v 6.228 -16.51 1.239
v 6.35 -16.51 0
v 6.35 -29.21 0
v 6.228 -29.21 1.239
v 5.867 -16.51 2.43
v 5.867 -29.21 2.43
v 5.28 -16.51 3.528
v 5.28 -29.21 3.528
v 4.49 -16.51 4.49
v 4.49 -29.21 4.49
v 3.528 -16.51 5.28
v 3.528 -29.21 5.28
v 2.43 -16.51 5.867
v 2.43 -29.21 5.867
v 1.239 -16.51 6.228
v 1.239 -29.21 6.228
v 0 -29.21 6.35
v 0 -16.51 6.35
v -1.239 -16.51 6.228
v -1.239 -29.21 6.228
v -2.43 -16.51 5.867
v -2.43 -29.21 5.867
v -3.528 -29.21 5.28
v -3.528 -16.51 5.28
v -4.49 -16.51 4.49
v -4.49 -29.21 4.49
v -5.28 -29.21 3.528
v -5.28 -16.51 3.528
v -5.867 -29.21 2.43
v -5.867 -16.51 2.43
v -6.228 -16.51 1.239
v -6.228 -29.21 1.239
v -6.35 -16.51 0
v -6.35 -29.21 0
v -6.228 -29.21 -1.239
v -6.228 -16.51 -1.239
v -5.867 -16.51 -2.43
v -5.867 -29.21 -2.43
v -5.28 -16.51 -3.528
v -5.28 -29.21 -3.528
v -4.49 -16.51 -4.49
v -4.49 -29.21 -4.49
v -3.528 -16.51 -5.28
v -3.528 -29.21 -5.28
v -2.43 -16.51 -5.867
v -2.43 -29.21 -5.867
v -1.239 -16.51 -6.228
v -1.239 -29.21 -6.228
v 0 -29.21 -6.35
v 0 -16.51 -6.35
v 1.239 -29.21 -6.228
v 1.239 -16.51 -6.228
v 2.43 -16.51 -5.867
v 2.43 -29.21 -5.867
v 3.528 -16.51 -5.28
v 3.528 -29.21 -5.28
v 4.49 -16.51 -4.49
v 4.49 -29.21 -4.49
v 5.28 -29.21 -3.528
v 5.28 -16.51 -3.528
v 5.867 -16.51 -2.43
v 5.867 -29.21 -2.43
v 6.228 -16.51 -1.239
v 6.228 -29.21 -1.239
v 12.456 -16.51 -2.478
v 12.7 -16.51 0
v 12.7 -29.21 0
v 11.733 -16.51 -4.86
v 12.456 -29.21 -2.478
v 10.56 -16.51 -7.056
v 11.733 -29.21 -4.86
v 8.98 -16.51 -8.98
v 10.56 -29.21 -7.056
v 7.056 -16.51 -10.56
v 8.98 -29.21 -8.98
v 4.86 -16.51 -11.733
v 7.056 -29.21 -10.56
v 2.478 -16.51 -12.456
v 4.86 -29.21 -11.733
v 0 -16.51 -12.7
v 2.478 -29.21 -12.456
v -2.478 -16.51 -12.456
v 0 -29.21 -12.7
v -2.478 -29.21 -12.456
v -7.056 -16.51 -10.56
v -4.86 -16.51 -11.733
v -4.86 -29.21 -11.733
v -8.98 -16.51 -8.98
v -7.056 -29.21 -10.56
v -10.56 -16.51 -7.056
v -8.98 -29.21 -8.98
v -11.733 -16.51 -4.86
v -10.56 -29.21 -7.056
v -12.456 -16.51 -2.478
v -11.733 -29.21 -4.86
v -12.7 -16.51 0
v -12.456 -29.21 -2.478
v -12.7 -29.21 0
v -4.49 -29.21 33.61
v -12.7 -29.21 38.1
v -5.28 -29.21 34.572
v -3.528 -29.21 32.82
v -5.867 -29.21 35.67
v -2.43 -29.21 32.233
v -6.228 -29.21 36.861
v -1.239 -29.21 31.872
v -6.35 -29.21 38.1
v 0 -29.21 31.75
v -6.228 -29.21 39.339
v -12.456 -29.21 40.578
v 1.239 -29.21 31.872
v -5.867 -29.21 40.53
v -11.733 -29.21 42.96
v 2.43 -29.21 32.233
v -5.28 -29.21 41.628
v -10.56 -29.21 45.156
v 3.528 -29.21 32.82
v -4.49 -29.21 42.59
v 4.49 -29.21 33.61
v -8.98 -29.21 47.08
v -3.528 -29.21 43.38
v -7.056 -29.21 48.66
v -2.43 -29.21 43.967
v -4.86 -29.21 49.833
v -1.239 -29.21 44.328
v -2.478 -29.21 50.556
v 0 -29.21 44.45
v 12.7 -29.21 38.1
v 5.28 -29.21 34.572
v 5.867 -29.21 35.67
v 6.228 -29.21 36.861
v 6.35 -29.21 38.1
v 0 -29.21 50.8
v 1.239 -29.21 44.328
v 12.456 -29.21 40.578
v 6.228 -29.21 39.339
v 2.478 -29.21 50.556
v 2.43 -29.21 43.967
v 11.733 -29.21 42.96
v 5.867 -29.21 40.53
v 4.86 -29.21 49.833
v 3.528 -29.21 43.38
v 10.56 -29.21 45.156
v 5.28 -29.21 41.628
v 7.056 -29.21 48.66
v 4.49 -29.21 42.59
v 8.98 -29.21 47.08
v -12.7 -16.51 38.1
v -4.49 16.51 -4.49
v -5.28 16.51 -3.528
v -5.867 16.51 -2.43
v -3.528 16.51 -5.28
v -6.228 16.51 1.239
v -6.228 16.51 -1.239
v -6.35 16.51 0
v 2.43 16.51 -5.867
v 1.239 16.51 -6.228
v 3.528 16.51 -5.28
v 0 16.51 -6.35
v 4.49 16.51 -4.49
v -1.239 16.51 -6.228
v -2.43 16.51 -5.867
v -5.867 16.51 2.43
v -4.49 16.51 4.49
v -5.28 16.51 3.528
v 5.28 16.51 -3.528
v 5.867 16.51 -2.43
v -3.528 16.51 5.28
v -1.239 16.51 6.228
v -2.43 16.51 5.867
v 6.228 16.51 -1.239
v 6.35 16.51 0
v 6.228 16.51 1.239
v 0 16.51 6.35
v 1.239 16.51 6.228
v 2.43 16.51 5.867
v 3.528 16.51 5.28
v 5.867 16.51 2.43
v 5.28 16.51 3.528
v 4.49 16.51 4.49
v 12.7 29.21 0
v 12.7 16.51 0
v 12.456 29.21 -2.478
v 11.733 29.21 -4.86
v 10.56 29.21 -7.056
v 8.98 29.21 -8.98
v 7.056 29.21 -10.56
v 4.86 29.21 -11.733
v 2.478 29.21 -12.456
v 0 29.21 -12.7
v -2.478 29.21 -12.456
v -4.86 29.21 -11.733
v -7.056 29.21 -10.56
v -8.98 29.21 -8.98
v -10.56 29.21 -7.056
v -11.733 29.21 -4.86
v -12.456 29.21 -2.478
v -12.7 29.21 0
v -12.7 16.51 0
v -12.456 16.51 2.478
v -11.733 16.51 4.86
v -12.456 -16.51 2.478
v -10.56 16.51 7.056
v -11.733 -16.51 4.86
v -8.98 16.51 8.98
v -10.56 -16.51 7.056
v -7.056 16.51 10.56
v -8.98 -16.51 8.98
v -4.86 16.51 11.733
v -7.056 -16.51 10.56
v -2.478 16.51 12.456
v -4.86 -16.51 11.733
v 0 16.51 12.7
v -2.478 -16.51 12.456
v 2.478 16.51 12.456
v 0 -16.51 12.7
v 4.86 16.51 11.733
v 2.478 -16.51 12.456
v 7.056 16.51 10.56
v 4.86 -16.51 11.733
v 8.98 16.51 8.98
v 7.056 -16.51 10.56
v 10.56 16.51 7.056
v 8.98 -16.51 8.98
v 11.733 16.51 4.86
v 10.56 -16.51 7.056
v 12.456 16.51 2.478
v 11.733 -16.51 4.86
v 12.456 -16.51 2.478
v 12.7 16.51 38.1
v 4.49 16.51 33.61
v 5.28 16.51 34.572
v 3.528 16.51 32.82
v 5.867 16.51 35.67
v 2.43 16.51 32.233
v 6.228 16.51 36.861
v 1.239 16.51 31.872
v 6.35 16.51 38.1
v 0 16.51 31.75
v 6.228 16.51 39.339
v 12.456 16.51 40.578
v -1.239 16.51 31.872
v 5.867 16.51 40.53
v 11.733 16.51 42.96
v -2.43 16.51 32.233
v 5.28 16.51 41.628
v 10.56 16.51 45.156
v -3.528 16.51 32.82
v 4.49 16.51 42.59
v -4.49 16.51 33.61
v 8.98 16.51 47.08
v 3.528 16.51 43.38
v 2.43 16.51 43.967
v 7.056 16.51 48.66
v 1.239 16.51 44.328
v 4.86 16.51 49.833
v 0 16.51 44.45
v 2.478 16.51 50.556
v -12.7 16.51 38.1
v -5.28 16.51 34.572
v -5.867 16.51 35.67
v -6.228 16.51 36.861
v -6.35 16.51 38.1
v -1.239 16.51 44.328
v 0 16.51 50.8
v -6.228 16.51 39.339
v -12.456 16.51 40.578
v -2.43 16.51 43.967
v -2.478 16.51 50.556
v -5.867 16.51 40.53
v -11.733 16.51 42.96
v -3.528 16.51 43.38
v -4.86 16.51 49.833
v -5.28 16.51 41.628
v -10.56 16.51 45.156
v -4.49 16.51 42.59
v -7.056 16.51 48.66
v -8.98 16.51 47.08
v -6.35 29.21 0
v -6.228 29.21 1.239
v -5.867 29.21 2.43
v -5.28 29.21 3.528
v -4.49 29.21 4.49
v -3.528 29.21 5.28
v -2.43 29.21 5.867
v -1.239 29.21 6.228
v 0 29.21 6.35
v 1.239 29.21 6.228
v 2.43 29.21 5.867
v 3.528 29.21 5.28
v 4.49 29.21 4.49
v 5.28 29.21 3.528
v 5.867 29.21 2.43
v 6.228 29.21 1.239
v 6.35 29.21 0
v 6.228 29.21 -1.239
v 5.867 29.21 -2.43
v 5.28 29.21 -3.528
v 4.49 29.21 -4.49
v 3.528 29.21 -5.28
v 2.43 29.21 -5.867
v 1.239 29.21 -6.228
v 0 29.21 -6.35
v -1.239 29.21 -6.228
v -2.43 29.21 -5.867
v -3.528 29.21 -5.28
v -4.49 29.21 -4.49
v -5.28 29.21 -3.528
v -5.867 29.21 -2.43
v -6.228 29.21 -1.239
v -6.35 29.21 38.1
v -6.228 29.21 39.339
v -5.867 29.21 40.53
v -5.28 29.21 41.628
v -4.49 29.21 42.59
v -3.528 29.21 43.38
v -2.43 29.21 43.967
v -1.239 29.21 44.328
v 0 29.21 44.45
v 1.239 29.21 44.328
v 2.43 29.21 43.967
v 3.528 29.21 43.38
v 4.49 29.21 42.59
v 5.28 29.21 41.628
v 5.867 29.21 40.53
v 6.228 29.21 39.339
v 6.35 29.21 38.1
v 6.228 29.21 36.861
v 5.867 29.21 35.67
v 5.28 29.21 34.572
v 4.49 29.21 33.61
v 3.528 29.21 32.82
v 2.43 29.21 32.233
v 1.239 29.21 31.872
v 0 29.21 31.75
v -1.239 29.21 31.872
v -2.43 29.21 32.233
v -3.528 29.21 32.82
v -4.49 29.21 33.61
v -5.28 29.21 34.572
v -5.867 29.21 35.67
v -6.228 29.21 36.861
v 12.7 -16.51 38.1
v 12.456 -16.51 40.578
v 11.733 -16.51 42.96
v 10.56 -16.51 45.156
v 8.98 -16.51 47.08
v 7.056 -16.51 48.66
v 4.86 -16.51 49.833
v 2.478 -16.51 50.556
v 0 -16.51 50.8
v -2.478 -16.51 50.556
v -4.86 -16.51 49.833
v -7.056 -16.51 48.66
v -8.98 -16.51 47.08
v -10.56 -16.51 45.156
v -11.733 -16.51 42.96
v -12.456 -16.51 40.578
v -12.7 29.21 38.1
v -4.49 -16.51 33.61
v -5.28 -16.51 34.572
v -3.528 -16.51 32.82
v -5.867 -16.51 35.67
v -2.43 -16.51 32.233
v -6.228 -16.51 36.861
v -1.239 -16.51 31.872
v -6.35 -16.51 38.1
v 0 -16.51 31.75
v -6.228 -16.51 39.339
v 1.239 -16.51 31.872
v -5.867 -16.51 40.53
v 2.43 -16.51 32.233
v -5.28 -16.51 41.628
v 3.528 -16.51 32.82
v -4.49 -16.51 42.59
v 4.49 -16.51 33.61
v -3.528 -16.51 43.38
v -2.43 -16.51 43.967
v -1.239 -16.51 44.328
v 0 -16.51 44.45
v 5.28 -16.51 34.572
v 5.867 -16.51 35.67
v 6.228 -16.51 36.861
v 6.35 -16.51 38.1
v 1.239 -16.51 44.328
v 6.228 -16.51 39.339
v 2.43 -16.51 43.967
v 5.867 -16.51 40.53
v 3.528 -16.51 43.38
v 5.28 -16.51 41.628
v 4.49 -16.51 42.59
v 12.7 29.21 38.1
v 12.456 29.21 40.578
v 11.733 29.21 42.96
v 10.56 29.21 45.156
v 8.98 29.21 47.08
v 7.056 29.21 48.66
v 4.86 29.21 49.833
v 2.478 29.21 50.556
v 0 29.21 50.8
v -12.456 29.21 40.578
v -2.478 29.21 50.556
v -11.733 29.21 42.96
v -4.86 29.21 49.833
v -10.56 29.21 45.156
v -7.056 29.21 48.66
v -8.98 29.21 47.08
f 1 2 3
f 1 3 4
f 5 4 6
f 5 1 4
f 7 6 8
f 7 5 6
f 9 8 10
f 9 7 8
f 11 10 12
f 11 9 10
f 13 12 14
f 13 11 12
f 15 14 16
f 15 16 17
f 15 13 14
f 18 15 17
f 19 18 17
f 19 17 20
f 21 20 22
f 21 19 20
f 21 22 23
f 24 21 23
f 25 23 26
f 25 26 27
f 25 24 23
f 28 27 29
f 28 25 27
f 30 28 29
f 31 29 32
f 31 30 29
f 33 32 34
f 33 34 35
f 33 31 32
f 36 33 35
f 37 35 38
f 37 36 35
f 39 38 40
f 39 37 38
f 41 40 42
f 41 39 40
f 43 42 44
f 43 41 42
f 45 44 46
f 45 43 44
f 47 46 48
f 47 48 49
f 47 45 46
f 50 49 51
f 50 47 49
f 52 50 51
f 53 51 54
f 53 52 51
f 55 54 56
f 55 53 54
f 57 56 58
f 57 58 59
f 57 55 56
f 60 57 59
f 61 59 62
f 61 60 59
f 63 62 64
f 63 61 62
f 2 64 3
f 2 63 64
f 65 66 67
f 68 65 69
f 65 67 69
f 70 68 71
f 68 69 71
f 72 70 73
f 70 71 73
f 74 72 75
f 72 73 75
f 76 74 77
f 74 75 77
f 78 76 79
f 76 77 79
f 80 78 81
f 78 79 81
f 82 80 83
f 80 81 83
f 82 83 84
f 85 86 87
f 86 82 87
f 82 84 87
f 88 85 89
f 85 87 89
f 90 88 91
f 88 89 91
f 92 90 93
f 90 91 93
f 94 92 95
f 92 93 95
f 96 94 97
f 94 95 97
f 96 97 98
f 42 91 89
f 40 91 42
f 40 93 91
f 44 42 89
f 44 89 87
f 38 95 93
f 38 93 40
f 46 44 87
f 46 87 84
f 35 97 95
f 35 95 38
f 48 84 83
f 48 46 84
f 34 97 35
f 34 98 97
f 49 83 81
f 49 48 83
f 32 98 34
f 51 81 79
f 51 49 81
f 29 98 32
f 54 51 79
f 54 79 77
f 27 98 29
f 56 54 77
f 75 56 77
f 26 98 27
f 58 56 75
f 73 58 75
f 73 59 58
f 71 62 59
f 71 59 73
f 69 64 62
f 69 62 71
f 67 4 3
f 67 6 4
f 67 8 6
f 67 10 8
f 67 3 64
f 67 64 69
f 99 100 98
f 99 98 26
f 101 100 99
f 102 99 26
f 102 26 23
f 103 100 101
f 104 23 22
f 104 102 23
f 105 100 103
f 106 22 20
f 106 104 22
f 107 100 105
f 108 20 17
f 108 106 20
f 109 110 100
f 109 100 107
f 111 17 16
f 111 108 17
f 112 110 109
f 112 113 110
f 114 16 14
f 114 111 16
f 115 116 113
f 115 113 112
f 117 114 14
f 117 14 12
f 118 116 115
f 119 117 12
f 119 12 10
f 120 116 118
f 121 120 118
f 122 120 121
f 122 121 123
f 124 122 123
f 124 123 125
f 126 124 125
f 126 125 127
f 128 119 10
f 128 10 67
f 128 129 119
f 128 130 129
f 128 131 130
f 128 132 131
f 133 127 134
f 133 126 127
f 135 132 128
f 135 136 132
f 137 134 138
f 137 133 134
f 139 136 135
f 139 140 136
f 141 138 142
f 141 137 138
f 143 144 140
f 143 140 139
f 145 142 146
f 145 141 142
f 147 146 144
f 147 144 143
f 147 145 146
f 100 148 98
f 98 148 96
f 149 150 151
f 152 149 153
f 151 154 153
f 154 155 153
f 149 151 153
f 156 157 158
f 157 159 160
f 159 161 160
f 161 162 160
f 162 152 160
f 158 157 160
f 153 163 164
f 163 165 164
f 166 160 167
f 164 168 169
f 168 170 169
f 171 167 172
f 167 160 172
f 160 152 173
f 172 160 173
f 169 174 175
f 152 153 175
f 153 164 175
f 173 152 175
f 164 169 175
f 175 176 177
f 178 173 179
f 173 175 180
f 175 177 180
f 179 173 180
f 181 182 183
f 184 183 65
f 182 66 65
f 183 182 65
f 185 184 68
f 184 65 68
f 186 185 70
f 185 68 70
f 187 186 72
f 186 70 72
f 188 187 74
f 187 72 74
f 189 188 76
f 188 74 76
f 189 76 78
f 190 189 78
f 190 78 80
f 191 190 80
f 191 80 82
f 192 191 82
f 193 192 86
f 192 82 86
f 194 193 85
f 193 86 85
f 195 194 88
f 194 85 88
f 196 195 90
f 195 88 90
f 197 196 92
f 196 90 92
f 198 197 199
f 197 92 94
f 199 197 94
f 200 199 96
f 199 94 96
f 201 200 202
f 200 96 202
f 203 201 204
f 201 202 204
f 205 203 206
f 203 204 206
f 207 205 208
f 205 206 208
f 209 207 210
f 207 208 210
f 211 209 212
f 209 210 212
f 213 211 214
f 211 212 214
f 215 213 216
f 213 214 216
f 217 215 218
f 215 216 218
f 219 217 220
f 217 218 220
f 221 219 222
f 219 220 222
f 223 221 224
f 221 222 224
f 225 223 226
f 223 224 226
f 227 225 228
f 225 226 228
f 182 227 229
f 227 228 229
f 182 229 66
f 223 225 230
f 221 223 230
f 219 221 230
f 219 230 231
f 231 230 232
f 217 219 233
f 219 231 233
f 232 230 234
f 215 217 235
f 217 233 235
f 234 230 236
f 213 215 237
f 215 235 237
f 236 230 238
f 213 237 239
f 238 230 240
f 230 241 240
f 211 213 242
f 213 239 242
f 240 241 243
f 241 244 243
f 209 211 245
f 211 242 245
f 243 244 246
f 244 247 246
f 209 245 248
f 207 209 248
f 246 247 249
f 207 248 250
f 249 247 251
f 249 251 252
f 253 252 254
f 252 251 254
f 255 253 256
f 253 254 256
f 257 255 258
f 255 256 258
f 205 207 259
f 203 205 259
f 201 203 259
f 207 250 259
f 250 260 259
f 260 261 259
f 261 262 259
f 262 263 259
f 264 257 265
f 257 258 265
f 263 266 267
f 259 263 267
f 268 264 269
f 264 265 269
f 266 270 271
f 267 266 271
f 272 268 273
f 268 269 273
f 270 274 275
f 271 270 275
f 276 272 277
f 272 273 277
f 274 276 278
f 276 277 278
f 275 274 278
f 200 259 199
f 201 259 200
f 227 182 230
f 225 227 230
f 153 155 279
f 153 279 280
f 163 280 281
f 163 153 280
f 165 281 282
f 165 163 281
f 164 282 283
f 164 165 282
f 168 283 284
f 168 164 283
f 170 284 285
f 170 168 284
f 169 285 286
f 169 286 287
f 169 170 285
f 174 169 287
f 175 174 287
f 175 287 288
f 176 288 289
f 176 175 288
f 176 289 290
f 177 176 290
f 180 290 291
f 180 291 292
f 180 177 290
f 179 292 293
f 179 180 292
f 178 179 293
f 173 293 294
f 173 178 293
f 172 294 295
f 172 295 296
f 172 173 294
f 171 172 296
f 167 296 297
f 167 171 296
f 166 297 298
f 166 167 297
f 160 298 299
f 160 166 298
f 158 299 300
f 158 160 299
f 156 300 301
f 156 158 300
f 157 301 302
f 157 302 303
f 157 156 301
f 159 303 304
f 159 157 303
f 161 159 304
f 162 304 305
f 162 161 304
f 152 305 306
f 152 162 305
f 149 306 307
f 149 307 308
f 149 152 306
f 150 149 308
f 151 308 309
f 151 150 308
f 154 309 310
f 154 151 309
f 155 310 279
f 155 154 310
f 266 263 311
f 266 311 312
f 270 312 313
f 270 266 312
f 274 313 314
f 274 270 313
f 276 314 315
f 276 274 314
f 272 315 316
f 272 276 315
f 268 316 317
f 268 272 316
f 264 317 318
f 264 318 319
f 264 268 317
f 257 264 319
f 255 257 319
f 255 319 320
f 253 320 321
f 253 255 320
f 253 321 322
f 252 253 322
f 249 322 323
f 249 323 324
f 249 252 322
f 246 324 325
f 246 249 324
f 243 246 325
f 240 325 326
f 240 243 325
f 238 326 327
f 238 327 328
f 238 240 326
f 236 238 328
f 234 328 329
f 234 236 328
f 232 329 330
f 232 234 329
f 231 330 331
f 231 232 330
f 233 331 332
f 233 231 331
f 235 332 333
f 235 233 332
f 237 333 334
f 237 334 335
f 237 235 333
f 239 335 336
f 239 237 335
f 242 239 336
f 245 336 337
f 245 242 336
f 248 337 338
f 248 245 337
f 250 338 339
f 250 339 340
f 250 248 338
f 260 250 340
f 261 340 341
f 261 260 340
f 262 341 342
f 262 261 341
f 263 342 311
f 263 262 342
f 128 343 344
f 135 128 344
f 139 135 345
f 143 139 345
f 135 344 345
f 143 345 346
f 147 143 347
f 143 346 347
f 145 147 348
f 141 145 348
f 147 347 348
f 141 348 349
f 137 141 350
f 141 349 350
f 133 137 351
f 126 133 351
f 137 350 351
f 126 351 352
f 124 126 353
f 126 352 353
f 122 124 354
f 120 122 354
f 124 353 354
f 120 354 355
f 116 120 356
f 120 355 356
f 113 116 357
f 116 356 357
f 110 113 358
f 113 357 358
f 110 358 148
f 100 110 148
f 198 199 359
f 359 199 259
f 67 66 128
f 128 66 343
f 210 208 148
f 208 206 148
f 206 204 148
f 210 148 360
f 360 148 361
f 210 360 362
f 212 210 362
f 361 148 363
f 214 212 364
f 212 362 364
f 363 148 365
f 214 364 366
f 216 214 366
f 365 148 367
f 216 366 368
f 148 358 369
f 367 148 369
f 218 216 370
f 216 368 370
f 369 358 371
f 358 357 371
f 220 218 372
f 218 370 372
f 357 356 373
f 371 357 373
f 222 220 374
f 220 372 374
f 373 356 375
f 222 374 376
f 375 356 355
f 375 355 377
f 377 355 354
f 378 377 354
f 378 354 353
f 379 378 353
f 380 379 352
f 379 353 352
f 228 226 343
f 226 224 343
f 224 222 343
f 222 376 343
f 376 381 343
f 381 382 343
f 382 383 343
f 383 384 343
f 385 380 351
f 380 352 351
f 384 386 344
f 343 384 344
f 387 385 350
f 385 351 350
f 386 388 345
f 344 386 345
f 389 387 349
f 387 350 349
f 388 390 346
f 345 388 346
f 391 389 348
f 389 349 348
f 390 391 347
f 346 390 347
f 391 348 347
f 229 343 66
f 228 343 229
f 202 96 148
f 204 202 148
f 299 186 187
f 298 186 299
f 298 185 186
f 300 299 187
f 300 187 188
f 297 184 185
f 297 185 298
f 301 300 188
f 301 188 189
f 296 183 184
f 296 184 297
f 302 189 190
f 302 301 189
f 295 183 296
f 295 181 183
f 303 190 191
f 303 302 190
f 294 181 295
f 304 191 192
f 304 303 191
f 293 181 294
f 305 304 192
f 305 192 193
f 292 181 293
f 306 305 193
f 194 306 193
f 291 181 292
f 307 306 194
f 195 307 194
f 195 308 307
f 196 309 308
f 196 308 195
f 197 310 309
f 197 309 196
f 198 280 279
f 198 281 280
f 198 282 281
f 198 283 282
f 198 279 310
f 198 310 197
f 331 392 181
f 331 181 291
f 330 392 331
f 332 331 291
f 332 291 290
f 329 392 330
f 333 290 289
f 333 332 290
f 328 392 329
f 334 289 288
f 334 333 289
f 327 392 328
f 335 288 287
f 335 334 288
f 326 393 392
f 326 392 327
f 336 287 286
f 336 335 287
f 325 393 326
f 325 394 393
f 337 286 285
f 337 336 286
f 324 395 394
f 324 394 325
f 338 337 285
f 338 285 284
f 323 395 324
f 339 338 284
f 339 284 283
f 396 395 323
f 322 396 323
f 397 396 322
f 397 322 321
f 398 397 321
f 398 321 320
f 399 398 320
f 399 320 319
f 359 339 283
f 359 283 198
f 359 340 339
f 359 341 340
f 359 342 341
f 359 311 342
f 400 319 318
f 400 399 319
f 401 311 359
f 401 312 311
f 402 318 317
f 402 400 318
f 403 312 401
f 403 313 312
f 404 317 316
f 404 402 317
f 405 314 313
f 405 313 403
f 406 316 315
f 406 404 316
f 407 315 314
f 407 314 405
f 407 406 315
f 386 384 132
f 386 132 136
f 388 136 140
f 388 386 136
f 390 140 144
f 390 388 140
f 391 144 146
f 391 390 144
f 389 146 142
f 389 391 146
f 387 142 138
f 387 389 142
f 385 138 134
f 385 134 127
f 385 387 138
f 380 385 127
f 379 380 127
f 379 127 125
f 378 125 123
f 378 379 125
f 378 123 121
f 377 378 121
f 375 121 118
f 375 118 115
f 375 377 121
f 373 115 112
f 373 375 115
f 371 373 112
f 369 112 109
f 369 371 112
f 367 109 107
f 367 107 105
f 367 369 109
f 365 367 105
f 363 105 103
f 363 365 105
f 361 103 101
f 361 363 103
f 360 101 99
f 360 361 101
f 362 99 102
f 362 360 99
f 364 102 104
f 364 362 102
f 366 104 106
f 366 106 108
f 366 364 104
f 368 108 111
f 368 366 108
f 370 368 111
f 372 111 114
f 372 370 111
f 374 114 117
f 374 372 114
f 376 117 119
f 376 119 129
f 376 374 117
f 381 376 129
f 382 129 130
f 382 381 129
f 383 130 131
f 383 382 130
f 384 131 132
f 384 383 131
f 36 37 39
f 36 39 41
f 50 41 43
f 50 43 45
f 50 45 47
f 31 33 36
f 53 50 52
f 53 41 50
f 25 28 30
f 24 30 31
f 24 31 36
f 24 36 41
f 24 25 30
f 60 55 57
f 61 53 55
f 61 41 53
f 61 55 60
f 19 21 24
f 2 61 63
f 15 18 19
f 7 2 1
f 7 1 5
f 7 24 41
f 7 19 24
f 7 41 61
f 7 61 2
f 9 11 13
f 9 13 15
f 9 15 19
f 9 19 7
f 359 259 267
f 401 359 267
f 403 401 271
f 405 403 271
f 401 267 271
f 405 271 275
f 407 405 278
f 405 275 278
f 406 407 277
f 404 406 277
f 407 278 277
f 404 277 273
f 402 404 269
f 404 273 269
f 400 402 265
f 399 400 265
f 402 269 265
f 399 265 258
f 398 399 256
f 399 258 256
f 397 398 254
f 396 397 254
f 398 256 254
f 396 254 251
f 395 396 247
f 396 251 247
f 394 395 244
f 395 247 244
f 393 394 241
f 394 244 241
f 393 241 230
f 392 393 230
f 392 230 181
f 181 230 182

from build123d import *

# Parameters (mm, degrees)
F0_R     = 12.7
F1_DEPTH = 16.51
F2_R     = 6.35
F3_DEPTH = 12.7
F4_R     = 6.35
F5_DEPTH = 12.7


with BuildPart() as f1:
    # F0 (on Front) → F1 (new body, symmetric)
    with BuildSketch(Plane.XZ):
        Circle(F0_R)
    extrude(amount=F1_DEPTH, both=True)

    # F2 (on face) → F3 (join)
    with BuildSketch(Plane.XZ.offset(16.51)):
        with BuildLine():
            Line((12.7, -1e-06), (12.699999, 38.099999))
            ThreePointArc((12.699999, 38.099999), (0, 50.8), (-12.700001, 38.1))
            Line((-12.700001, 38.1), (-12.7, 0))
            ThreePointArc((-12.7, 0), (0, -12.7), (12.7, -1e-06))
        make_face()
        Circle(F2_R, mode=Mode.SUBTRACT)
        with Locations((-1e-06, 38.1)):
            Circle(F2_R, mode=Mode.SUBTRACT)
    extrude(amount=F3_DEPTH)

    # F4 (on face) → F5 (join)
    with BuildSketch(Plane(origin=(0, 16.51, 0), x_dir=(-1, 0, 0), z_dir=(0, 1, 0))):
        with BuildLine():
            Line((12.7, -1e-06), (12.699999, 38.099999))
            ThreePointArc((12.699999, 38.099999), (0, 50.8), (-12.700001, 38.1))
            Line((-12.700001, 38.1), (-12.7, 0))
            ThreePointArc((-12.7, 0), (0, -12.7), (12.7, -1e-06))
        make_face()
        Circle(F4_R, mode=Mode.SUBTRACT)
        with Locations((-1e-06, 38.1)):
            Circle(F4_R, mode=Mode.SUBTRACT)
    extrude(amount=F5_DEPTH)


solid = f1.part
